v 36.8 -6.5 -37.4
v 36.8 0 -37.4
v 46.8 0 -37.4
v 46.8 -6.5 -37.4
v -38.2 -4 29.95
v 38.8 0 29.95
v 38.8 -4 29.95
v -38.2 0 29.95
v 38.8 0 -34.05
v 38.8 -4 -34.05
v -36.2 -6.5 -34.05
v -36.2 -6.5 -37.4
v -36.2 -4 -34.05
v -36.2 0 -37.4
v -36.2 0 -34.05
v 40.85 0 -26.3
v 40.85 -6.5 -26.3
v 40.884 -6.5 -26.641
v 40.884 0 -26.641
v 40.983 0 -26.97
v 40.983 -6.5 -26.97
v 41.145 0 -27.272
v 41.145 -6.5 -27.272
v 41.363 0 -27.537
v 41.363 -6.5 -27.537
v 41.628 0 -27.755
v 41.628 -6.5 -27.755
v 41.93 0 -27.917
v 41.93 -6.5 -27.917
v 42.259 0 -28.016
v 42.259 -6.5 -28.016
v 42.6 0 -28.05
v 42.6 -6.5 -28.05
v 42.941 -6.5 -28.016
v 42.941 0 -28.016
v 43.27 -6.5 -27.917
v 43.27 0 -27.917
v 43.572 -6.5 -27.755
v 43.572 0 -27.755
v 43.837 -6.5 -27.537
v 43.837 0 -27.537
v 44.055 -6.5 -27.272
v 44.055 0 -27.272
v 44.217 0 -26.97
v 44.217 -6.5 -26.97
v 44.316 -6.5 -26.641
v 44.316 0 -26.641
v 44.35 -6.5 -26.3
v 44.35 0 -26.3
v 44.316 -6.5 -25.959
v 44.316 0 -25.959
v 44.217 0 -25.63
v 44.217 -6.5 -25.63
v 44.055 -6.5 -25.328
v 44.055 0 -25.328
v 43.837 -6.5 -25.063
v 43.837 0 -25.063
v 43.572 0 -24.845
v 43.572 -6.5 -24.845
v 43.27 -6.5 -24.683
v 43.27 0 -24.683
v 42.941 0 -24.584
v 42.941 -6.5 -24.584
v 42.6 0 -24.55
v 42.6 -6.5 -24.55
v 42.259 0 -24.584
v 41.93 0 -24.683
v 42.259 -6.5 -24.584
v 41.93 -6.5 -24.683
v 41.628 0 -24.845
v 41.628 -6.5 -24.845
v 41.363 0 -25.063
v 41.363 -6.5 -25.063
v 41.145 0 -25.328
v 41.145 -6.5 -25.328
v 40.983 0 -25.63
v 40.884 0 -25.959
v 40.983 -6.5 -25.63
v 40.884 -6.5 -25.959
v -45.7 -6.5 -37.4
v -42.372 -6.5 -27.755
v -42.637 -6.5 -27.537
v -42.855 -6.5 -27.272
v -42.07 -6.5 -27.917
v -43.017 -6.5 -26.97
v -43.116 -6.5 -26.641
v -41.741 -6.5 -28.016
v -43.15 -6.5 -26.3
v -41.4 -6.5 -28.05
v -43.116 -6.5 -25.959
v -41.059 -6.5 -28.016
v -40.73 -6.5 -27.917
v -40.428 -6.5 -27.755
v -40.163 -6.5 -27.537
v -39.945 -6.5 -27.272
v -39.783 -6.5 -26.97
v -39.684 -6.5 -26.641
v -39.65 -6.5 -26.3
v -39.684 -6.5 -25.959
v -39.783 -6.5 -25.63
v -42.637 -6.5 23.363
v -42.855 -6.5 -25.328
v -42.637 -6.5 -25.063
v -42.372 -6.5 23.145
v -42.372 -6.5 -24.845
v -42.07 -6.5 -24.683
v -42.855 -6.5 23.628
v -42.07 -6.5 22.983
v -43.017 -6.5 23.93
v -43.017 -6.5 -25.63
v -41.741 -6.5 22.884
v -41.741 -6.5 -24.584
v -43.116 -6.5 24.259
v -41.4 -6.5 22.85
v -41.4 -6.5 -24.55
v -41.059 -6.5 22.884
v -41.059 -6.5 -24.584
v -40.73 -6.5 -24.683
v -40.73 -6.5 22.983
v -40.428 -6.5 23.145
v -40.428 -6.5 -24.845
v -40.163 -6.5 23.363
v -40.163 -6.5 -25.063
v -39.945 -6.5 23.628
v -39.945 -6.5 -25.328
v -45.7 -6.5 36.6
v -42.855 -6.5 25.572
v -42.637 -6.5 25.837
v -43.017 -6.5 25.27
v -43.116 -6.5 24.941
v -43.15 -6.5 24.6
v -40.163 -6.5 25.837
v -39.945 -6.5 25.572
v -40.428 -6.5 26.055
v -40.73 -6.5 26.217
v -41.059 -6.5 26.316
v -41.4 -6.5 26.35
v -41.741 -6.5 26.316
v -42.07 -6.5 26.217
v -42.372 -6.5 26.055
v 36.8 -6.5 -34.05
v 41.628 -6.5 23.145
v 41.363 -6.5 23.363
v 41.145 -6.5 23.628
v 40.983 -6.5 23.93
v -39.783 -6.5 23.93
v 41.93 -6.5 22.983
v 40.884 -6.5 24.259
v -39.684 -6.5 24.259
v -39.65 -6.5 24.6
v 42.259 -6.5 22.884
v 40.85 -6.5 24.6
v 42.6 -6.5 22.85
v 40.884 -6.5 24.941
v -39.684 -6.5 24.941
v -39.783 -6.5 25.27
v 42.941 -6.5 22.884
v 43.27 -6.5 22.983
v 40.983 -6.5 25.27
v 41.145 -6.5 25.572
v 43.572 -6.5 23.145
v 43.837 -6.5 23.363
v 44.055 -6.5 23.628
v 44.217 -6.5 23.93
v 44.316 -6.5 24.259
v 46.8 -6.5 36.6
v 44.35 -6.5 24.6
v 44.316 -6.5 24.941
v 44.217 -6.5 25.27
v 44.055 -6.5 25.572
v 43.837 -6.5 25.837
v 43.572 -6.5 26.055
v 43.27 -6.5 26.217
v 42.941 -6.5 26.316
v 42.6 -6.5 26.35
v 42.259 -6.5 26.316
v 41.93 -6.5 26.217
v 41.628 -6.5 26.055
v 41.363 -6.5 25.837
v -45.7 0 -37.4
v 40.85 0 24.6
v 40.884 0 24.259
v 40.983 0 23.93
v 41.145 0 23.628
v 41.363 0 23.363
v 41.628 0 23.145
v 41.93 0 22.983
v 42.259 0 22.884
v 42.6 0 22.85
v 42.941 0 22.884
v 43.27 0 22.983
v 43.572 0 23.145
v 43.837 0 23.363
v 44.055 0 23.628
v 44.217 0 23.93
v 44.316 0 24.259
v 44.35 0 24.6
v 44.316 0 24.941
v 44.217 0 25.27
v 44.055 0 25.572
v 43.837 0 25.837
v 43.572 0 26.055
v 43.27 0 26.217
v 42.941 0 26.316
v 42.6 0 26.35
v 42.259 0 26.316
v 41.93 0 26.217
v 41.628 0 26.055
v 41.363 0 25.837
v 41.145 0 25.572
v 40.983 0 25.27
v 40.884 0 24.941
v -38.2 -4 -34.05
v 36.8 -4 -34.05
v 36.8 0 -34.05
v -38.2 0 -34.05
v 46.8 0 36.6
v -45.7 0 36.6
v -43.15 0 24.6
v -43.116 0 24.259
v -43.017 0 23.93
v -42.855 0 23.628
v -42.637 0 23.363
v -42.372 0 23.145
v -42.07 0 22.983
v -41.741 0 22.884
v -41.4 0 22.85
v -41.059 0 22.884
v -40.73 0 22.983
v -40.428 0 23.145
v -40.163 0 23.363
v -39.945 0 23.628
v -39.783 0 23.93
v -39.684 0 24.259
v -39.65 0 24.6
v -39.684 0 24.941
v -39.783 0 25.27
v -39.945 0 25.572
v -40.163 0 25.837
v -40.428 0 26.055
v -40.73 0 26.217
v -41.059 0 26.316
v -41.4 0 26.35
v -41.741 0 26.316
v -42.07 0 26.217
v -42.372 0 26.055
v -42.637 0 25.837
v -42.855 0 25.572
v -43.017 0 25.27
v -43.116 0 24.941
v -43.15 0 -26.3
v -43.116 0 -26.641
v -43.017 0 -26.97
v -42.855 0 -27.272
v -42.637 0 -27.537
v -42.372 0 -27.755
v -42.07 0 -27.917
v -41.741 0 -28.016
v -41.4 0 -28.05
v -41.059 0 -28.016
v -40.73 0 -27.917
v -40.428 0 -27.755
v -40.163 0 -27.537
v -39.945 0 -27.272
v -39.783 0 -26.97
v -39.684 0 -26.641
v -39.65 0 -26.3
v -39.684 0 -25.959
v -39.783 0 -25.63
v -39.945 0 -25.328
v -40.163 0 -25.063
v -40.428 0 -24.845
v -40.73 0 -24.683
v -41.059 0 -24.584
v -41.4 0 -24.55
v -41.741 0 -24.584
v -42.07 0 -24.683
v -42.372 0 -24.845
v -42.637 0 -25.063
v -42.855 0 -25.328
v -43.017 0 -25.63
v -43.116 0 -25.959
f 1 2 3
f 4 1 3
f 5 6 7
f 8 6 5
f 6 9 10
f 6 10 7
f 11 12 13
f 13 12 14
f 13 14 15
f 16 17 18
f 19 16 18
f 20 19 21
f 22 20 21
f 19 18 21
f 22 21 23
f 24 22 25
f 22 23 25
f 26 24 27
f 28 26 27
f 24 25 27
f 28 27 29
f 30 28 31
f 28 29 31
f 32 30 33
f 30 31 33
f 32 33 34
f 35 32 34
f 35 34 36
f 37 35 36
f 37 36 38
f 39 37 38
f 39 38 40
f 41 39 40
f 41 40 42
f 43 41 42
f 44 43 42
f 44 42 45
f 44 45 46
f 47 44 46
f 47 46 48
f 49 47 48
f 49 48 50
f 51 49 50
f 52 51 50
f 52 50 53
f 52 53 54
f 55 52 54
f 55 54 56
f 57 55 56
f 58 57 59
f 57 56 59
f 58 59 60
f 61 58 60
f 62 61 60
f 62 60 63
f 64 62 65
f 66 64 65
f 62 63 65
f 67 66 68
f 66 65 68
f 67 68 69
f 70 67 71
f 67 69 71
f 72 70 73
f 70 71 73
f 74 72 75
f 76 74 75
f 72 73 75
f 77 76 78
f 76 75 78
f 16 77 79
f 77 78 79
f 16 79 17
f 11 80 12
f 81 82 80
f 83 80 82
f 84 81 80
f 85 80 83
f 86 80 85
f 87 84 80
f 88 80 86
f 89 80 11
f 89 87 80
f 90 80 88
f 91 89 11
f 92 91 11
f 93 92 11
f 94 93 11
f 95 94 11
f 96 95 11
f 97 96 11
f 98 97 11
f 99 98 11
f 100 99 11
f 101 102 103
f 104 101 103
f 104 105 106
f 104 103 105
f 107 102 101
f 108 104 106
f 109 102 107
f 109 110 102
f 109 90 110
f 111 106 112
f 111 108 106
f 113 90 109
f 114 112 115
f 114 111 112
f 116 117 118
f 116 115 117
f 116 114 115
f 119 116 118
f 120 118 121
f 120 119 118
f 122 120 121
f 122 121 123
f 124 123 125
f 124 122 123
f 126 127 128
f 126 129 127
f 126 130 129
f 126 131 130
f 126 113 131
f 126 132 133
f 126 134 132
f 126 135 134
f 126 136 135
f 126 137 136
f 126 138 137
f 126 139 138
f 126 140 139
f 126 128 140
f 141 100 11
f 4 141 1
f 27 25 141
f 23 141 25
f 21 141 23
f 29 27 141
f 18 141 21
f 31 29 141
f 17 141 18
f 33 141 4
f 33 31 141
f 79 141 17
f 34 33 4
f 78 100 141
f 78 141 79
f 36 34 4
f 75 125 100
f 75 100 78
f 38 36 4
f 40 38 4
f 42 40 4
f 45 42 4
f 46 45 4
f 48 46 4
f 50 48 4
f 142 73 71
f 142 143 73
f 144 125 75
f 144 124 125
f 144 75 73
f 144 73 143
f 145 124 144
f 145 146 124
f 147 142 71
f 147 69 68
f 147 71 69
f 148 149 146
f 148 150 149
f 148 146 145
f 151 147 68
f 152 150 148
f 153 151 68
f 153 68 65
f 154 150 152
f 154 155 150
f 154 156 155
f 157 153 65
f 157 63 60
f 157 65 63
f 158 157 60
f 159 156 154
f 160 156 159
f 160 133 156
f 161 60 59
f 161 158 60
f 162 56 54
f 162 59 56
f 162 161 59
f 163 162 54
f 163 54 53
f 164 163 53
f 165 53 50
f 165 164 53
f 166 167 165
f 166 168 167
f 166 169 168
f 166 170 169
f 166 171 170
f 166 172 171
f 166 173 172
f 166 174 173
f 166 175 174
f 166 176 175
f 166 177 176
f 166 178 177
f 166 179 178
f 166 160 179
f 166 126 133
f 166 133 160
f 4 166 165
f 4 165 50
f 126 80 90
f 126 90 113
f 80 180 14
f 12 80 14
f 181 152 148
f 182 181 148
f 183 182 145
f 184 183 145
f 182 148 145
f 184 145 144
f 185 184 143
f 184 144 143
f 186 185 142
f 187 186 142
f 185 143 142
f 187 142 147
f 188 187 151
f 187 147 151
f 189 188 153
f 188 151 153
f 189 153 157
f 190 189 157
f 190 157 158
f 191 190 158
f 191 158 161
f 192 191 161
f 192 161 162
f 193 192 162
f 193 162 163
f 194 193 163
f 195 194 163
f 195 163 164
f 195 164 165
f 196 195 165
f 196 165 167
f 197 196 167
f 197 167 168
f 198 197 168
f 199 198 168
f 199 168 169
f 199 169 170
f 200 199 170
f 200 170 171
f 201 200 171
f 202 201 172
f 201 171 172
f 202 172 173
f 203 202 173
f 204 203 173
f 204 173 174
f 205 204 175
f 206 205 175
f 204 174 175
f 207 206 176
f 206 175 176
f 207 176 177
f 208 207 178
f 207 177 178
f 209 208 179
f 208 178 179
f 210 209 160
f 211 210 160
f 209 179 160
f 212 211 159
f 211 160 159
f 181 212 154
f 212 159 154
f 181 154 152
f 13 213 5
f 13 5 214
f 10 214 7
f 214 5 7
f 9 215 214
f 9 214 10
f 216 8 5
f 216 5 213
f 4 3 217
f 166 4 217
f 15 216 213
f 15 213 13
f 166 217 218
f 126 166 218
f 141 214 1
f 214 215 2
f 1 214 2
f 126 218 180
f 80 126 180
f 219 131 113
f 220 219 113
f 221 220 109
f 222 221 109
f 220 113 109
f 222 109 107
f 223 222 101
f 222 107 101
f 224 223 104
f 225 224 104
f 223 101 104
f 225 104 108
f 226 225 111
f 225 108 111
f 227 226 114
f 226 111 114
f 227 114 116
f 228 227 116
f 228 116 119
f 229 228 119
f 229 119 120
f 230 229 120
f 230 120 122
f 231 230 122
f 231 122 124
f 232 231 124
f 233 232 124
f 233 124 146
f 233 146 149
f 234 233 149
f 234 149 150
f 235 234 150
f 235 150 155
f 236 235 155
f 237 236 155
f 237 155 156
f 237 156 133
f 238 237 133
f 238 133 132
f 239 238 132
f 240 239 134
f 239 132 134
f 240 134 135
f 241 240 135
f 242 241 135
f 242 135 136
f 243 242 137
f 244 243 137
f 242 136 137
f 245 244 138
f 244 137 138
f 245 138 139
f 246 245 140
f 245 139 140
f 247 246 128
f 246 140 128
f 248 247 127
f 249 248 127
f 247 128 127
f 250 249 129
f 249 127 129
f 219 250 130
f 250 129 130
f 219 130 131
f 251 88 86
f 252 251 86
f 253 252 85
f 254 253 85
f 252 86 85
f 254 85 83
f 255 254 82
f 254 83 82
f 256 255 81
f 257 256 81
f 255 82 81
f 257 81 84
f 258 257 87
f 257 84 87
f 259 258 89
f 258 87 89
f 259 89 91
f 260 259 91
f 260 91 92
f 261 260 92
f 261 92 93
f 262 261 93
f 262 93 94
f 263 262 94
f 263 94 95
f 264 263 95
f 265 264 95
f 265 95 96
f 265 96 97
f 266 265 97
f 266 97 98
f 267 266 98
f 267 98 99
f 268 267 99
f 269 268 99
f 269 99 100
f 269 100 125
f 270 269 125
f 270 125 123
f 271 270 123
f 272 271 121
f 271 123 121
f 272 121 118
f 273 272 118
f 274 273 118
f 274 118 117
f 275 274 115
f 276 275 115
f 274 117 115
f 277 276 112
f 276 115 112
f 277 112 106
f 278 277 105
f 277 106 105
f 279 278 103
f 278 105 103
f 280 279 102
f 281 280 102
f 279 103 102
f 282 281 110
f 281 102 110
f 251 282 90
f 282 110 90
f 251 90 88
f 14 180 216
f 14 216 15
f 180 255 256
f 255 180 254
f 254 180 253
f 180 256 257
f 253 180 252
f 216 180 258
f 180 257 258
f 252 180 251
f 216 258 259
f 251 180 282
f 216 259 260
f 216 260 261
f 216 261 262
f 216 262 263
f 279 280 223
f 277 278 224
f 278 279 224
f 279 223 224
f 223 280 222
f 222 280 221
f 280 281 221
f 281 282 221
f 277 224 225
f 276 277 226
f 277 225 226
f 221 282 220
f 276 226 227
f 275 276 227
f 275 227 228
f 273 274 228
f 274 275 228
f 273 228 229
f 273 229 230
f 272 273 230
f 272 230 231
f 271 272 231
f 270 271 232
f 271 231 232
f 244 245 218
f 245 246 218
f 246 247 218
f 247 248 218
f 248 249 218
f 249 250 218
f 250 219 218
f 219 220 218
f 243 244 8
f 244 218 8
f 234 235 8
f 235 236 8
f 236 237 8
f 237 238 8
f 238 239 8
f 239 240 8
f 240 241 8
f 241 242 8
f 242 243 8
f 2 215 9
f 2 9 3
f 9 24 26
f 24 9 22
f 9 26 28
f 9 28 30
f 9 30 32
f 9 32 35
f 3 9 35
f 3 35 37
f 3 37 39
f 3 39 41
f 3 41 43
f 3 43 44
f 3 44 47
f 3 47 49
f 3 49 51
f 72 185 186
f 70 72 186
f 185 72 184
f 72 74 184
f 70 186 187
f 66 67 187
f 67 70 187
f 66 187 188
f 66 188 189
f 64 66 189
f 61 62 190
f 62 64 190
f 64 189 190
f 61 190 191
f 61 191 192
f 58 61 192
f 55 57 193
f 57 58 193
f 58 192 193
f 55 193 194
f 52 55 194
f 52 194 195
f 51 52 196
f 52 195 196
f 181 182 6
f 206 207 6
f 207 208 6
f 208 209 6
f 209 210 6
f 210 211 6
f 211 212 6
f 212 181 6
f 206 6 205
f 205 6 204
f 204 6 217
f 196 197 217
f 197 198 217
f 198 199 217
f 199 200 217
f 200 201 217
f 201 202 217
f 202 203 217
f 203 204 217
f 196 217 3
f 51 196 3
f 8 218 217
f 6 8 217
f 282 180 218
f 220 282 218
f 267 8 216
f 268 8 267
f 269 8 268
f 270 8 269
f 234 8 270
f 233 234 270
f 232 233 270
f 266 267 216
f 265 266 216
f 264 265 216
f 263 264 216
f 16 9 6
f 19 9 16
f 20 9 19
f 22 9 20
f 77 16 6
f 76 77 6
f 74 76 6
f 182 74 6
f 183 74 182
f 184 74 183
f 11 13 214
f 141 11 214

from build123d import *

# Parameters (mm, degrees)
F0_W     = 71.45
F0_H     = 53.85
F1_DEPTH = 6.5
F0_W_2   = 73
F0_H_2   = 3.35
F2_DEPTH = 4
F3_D     = 3.5


with BuildPart() as f1:
    # F0 (on Front) → F1 (new body)
    with BuildSketch(Plane.XZ):
        Polygon((-38.2, -34.05), (-38.2, 29.95), (38.8, 29.95), (38.8, -34.05), (36.8, -34.05), (36.8, -37.4), (46.8, -37.4), (46.8, 36.6), (-45.7, 36.6), (-45.7, -37.4), (-36.2, -37.4), (-36.2, -34.05), align=None)
        Polygon((38.8, 29.95), (-38.2, 29.95), (-38.2, -34.05), (-36.2, -34.05), (36.8, -34.05), (38.8, -34.05), align=None)
        with Locations((-0.025, -0.025)):
            Rectangle(F0_W, F0_H, mode=Mode.SUBTRACT)
        with Locations((-0.025, -0.025)):
            Rectangle(F0_W, F0_H)
    extrude(amount=F1_DEPTH)

    # F0 (on Front) → F2 (cut)
    with BuildSketch(Plane.XZ):
        Polygon((38.8, 29.95), (-38.2, 29.95), (-38.2, -34.05), (-36.2, -34.05), (36.8, -34.05), (38.8, -34.05), align=None)
        with Locations((-0.025, -0.025)):
            Rectangle(F0_W, F0_H, mode=Mode.SUBTRACT)
        with Locations((-0.025, -0.025)):
            Rectangle(F0_W, F0_H)
        with Locations((0.3, -35.725)):
            Rectangle(F0_W_2, F0_H_2)
    extrude(amount=F2_DEPTH, mode=Mode.SUBTRACT)

    # F3 (through all)
    with Locations(Plane(origin=(0, 0, 0), x_dir=(1, 0, 0), z_dir=(0, 1, 0))):
        with Locations((-41.4, -24.6), (42.6, -24.6), (42.6, 26.3), (-41.4, 26.3)):
            Hole(F3_D / 2)


solid = f1.part
